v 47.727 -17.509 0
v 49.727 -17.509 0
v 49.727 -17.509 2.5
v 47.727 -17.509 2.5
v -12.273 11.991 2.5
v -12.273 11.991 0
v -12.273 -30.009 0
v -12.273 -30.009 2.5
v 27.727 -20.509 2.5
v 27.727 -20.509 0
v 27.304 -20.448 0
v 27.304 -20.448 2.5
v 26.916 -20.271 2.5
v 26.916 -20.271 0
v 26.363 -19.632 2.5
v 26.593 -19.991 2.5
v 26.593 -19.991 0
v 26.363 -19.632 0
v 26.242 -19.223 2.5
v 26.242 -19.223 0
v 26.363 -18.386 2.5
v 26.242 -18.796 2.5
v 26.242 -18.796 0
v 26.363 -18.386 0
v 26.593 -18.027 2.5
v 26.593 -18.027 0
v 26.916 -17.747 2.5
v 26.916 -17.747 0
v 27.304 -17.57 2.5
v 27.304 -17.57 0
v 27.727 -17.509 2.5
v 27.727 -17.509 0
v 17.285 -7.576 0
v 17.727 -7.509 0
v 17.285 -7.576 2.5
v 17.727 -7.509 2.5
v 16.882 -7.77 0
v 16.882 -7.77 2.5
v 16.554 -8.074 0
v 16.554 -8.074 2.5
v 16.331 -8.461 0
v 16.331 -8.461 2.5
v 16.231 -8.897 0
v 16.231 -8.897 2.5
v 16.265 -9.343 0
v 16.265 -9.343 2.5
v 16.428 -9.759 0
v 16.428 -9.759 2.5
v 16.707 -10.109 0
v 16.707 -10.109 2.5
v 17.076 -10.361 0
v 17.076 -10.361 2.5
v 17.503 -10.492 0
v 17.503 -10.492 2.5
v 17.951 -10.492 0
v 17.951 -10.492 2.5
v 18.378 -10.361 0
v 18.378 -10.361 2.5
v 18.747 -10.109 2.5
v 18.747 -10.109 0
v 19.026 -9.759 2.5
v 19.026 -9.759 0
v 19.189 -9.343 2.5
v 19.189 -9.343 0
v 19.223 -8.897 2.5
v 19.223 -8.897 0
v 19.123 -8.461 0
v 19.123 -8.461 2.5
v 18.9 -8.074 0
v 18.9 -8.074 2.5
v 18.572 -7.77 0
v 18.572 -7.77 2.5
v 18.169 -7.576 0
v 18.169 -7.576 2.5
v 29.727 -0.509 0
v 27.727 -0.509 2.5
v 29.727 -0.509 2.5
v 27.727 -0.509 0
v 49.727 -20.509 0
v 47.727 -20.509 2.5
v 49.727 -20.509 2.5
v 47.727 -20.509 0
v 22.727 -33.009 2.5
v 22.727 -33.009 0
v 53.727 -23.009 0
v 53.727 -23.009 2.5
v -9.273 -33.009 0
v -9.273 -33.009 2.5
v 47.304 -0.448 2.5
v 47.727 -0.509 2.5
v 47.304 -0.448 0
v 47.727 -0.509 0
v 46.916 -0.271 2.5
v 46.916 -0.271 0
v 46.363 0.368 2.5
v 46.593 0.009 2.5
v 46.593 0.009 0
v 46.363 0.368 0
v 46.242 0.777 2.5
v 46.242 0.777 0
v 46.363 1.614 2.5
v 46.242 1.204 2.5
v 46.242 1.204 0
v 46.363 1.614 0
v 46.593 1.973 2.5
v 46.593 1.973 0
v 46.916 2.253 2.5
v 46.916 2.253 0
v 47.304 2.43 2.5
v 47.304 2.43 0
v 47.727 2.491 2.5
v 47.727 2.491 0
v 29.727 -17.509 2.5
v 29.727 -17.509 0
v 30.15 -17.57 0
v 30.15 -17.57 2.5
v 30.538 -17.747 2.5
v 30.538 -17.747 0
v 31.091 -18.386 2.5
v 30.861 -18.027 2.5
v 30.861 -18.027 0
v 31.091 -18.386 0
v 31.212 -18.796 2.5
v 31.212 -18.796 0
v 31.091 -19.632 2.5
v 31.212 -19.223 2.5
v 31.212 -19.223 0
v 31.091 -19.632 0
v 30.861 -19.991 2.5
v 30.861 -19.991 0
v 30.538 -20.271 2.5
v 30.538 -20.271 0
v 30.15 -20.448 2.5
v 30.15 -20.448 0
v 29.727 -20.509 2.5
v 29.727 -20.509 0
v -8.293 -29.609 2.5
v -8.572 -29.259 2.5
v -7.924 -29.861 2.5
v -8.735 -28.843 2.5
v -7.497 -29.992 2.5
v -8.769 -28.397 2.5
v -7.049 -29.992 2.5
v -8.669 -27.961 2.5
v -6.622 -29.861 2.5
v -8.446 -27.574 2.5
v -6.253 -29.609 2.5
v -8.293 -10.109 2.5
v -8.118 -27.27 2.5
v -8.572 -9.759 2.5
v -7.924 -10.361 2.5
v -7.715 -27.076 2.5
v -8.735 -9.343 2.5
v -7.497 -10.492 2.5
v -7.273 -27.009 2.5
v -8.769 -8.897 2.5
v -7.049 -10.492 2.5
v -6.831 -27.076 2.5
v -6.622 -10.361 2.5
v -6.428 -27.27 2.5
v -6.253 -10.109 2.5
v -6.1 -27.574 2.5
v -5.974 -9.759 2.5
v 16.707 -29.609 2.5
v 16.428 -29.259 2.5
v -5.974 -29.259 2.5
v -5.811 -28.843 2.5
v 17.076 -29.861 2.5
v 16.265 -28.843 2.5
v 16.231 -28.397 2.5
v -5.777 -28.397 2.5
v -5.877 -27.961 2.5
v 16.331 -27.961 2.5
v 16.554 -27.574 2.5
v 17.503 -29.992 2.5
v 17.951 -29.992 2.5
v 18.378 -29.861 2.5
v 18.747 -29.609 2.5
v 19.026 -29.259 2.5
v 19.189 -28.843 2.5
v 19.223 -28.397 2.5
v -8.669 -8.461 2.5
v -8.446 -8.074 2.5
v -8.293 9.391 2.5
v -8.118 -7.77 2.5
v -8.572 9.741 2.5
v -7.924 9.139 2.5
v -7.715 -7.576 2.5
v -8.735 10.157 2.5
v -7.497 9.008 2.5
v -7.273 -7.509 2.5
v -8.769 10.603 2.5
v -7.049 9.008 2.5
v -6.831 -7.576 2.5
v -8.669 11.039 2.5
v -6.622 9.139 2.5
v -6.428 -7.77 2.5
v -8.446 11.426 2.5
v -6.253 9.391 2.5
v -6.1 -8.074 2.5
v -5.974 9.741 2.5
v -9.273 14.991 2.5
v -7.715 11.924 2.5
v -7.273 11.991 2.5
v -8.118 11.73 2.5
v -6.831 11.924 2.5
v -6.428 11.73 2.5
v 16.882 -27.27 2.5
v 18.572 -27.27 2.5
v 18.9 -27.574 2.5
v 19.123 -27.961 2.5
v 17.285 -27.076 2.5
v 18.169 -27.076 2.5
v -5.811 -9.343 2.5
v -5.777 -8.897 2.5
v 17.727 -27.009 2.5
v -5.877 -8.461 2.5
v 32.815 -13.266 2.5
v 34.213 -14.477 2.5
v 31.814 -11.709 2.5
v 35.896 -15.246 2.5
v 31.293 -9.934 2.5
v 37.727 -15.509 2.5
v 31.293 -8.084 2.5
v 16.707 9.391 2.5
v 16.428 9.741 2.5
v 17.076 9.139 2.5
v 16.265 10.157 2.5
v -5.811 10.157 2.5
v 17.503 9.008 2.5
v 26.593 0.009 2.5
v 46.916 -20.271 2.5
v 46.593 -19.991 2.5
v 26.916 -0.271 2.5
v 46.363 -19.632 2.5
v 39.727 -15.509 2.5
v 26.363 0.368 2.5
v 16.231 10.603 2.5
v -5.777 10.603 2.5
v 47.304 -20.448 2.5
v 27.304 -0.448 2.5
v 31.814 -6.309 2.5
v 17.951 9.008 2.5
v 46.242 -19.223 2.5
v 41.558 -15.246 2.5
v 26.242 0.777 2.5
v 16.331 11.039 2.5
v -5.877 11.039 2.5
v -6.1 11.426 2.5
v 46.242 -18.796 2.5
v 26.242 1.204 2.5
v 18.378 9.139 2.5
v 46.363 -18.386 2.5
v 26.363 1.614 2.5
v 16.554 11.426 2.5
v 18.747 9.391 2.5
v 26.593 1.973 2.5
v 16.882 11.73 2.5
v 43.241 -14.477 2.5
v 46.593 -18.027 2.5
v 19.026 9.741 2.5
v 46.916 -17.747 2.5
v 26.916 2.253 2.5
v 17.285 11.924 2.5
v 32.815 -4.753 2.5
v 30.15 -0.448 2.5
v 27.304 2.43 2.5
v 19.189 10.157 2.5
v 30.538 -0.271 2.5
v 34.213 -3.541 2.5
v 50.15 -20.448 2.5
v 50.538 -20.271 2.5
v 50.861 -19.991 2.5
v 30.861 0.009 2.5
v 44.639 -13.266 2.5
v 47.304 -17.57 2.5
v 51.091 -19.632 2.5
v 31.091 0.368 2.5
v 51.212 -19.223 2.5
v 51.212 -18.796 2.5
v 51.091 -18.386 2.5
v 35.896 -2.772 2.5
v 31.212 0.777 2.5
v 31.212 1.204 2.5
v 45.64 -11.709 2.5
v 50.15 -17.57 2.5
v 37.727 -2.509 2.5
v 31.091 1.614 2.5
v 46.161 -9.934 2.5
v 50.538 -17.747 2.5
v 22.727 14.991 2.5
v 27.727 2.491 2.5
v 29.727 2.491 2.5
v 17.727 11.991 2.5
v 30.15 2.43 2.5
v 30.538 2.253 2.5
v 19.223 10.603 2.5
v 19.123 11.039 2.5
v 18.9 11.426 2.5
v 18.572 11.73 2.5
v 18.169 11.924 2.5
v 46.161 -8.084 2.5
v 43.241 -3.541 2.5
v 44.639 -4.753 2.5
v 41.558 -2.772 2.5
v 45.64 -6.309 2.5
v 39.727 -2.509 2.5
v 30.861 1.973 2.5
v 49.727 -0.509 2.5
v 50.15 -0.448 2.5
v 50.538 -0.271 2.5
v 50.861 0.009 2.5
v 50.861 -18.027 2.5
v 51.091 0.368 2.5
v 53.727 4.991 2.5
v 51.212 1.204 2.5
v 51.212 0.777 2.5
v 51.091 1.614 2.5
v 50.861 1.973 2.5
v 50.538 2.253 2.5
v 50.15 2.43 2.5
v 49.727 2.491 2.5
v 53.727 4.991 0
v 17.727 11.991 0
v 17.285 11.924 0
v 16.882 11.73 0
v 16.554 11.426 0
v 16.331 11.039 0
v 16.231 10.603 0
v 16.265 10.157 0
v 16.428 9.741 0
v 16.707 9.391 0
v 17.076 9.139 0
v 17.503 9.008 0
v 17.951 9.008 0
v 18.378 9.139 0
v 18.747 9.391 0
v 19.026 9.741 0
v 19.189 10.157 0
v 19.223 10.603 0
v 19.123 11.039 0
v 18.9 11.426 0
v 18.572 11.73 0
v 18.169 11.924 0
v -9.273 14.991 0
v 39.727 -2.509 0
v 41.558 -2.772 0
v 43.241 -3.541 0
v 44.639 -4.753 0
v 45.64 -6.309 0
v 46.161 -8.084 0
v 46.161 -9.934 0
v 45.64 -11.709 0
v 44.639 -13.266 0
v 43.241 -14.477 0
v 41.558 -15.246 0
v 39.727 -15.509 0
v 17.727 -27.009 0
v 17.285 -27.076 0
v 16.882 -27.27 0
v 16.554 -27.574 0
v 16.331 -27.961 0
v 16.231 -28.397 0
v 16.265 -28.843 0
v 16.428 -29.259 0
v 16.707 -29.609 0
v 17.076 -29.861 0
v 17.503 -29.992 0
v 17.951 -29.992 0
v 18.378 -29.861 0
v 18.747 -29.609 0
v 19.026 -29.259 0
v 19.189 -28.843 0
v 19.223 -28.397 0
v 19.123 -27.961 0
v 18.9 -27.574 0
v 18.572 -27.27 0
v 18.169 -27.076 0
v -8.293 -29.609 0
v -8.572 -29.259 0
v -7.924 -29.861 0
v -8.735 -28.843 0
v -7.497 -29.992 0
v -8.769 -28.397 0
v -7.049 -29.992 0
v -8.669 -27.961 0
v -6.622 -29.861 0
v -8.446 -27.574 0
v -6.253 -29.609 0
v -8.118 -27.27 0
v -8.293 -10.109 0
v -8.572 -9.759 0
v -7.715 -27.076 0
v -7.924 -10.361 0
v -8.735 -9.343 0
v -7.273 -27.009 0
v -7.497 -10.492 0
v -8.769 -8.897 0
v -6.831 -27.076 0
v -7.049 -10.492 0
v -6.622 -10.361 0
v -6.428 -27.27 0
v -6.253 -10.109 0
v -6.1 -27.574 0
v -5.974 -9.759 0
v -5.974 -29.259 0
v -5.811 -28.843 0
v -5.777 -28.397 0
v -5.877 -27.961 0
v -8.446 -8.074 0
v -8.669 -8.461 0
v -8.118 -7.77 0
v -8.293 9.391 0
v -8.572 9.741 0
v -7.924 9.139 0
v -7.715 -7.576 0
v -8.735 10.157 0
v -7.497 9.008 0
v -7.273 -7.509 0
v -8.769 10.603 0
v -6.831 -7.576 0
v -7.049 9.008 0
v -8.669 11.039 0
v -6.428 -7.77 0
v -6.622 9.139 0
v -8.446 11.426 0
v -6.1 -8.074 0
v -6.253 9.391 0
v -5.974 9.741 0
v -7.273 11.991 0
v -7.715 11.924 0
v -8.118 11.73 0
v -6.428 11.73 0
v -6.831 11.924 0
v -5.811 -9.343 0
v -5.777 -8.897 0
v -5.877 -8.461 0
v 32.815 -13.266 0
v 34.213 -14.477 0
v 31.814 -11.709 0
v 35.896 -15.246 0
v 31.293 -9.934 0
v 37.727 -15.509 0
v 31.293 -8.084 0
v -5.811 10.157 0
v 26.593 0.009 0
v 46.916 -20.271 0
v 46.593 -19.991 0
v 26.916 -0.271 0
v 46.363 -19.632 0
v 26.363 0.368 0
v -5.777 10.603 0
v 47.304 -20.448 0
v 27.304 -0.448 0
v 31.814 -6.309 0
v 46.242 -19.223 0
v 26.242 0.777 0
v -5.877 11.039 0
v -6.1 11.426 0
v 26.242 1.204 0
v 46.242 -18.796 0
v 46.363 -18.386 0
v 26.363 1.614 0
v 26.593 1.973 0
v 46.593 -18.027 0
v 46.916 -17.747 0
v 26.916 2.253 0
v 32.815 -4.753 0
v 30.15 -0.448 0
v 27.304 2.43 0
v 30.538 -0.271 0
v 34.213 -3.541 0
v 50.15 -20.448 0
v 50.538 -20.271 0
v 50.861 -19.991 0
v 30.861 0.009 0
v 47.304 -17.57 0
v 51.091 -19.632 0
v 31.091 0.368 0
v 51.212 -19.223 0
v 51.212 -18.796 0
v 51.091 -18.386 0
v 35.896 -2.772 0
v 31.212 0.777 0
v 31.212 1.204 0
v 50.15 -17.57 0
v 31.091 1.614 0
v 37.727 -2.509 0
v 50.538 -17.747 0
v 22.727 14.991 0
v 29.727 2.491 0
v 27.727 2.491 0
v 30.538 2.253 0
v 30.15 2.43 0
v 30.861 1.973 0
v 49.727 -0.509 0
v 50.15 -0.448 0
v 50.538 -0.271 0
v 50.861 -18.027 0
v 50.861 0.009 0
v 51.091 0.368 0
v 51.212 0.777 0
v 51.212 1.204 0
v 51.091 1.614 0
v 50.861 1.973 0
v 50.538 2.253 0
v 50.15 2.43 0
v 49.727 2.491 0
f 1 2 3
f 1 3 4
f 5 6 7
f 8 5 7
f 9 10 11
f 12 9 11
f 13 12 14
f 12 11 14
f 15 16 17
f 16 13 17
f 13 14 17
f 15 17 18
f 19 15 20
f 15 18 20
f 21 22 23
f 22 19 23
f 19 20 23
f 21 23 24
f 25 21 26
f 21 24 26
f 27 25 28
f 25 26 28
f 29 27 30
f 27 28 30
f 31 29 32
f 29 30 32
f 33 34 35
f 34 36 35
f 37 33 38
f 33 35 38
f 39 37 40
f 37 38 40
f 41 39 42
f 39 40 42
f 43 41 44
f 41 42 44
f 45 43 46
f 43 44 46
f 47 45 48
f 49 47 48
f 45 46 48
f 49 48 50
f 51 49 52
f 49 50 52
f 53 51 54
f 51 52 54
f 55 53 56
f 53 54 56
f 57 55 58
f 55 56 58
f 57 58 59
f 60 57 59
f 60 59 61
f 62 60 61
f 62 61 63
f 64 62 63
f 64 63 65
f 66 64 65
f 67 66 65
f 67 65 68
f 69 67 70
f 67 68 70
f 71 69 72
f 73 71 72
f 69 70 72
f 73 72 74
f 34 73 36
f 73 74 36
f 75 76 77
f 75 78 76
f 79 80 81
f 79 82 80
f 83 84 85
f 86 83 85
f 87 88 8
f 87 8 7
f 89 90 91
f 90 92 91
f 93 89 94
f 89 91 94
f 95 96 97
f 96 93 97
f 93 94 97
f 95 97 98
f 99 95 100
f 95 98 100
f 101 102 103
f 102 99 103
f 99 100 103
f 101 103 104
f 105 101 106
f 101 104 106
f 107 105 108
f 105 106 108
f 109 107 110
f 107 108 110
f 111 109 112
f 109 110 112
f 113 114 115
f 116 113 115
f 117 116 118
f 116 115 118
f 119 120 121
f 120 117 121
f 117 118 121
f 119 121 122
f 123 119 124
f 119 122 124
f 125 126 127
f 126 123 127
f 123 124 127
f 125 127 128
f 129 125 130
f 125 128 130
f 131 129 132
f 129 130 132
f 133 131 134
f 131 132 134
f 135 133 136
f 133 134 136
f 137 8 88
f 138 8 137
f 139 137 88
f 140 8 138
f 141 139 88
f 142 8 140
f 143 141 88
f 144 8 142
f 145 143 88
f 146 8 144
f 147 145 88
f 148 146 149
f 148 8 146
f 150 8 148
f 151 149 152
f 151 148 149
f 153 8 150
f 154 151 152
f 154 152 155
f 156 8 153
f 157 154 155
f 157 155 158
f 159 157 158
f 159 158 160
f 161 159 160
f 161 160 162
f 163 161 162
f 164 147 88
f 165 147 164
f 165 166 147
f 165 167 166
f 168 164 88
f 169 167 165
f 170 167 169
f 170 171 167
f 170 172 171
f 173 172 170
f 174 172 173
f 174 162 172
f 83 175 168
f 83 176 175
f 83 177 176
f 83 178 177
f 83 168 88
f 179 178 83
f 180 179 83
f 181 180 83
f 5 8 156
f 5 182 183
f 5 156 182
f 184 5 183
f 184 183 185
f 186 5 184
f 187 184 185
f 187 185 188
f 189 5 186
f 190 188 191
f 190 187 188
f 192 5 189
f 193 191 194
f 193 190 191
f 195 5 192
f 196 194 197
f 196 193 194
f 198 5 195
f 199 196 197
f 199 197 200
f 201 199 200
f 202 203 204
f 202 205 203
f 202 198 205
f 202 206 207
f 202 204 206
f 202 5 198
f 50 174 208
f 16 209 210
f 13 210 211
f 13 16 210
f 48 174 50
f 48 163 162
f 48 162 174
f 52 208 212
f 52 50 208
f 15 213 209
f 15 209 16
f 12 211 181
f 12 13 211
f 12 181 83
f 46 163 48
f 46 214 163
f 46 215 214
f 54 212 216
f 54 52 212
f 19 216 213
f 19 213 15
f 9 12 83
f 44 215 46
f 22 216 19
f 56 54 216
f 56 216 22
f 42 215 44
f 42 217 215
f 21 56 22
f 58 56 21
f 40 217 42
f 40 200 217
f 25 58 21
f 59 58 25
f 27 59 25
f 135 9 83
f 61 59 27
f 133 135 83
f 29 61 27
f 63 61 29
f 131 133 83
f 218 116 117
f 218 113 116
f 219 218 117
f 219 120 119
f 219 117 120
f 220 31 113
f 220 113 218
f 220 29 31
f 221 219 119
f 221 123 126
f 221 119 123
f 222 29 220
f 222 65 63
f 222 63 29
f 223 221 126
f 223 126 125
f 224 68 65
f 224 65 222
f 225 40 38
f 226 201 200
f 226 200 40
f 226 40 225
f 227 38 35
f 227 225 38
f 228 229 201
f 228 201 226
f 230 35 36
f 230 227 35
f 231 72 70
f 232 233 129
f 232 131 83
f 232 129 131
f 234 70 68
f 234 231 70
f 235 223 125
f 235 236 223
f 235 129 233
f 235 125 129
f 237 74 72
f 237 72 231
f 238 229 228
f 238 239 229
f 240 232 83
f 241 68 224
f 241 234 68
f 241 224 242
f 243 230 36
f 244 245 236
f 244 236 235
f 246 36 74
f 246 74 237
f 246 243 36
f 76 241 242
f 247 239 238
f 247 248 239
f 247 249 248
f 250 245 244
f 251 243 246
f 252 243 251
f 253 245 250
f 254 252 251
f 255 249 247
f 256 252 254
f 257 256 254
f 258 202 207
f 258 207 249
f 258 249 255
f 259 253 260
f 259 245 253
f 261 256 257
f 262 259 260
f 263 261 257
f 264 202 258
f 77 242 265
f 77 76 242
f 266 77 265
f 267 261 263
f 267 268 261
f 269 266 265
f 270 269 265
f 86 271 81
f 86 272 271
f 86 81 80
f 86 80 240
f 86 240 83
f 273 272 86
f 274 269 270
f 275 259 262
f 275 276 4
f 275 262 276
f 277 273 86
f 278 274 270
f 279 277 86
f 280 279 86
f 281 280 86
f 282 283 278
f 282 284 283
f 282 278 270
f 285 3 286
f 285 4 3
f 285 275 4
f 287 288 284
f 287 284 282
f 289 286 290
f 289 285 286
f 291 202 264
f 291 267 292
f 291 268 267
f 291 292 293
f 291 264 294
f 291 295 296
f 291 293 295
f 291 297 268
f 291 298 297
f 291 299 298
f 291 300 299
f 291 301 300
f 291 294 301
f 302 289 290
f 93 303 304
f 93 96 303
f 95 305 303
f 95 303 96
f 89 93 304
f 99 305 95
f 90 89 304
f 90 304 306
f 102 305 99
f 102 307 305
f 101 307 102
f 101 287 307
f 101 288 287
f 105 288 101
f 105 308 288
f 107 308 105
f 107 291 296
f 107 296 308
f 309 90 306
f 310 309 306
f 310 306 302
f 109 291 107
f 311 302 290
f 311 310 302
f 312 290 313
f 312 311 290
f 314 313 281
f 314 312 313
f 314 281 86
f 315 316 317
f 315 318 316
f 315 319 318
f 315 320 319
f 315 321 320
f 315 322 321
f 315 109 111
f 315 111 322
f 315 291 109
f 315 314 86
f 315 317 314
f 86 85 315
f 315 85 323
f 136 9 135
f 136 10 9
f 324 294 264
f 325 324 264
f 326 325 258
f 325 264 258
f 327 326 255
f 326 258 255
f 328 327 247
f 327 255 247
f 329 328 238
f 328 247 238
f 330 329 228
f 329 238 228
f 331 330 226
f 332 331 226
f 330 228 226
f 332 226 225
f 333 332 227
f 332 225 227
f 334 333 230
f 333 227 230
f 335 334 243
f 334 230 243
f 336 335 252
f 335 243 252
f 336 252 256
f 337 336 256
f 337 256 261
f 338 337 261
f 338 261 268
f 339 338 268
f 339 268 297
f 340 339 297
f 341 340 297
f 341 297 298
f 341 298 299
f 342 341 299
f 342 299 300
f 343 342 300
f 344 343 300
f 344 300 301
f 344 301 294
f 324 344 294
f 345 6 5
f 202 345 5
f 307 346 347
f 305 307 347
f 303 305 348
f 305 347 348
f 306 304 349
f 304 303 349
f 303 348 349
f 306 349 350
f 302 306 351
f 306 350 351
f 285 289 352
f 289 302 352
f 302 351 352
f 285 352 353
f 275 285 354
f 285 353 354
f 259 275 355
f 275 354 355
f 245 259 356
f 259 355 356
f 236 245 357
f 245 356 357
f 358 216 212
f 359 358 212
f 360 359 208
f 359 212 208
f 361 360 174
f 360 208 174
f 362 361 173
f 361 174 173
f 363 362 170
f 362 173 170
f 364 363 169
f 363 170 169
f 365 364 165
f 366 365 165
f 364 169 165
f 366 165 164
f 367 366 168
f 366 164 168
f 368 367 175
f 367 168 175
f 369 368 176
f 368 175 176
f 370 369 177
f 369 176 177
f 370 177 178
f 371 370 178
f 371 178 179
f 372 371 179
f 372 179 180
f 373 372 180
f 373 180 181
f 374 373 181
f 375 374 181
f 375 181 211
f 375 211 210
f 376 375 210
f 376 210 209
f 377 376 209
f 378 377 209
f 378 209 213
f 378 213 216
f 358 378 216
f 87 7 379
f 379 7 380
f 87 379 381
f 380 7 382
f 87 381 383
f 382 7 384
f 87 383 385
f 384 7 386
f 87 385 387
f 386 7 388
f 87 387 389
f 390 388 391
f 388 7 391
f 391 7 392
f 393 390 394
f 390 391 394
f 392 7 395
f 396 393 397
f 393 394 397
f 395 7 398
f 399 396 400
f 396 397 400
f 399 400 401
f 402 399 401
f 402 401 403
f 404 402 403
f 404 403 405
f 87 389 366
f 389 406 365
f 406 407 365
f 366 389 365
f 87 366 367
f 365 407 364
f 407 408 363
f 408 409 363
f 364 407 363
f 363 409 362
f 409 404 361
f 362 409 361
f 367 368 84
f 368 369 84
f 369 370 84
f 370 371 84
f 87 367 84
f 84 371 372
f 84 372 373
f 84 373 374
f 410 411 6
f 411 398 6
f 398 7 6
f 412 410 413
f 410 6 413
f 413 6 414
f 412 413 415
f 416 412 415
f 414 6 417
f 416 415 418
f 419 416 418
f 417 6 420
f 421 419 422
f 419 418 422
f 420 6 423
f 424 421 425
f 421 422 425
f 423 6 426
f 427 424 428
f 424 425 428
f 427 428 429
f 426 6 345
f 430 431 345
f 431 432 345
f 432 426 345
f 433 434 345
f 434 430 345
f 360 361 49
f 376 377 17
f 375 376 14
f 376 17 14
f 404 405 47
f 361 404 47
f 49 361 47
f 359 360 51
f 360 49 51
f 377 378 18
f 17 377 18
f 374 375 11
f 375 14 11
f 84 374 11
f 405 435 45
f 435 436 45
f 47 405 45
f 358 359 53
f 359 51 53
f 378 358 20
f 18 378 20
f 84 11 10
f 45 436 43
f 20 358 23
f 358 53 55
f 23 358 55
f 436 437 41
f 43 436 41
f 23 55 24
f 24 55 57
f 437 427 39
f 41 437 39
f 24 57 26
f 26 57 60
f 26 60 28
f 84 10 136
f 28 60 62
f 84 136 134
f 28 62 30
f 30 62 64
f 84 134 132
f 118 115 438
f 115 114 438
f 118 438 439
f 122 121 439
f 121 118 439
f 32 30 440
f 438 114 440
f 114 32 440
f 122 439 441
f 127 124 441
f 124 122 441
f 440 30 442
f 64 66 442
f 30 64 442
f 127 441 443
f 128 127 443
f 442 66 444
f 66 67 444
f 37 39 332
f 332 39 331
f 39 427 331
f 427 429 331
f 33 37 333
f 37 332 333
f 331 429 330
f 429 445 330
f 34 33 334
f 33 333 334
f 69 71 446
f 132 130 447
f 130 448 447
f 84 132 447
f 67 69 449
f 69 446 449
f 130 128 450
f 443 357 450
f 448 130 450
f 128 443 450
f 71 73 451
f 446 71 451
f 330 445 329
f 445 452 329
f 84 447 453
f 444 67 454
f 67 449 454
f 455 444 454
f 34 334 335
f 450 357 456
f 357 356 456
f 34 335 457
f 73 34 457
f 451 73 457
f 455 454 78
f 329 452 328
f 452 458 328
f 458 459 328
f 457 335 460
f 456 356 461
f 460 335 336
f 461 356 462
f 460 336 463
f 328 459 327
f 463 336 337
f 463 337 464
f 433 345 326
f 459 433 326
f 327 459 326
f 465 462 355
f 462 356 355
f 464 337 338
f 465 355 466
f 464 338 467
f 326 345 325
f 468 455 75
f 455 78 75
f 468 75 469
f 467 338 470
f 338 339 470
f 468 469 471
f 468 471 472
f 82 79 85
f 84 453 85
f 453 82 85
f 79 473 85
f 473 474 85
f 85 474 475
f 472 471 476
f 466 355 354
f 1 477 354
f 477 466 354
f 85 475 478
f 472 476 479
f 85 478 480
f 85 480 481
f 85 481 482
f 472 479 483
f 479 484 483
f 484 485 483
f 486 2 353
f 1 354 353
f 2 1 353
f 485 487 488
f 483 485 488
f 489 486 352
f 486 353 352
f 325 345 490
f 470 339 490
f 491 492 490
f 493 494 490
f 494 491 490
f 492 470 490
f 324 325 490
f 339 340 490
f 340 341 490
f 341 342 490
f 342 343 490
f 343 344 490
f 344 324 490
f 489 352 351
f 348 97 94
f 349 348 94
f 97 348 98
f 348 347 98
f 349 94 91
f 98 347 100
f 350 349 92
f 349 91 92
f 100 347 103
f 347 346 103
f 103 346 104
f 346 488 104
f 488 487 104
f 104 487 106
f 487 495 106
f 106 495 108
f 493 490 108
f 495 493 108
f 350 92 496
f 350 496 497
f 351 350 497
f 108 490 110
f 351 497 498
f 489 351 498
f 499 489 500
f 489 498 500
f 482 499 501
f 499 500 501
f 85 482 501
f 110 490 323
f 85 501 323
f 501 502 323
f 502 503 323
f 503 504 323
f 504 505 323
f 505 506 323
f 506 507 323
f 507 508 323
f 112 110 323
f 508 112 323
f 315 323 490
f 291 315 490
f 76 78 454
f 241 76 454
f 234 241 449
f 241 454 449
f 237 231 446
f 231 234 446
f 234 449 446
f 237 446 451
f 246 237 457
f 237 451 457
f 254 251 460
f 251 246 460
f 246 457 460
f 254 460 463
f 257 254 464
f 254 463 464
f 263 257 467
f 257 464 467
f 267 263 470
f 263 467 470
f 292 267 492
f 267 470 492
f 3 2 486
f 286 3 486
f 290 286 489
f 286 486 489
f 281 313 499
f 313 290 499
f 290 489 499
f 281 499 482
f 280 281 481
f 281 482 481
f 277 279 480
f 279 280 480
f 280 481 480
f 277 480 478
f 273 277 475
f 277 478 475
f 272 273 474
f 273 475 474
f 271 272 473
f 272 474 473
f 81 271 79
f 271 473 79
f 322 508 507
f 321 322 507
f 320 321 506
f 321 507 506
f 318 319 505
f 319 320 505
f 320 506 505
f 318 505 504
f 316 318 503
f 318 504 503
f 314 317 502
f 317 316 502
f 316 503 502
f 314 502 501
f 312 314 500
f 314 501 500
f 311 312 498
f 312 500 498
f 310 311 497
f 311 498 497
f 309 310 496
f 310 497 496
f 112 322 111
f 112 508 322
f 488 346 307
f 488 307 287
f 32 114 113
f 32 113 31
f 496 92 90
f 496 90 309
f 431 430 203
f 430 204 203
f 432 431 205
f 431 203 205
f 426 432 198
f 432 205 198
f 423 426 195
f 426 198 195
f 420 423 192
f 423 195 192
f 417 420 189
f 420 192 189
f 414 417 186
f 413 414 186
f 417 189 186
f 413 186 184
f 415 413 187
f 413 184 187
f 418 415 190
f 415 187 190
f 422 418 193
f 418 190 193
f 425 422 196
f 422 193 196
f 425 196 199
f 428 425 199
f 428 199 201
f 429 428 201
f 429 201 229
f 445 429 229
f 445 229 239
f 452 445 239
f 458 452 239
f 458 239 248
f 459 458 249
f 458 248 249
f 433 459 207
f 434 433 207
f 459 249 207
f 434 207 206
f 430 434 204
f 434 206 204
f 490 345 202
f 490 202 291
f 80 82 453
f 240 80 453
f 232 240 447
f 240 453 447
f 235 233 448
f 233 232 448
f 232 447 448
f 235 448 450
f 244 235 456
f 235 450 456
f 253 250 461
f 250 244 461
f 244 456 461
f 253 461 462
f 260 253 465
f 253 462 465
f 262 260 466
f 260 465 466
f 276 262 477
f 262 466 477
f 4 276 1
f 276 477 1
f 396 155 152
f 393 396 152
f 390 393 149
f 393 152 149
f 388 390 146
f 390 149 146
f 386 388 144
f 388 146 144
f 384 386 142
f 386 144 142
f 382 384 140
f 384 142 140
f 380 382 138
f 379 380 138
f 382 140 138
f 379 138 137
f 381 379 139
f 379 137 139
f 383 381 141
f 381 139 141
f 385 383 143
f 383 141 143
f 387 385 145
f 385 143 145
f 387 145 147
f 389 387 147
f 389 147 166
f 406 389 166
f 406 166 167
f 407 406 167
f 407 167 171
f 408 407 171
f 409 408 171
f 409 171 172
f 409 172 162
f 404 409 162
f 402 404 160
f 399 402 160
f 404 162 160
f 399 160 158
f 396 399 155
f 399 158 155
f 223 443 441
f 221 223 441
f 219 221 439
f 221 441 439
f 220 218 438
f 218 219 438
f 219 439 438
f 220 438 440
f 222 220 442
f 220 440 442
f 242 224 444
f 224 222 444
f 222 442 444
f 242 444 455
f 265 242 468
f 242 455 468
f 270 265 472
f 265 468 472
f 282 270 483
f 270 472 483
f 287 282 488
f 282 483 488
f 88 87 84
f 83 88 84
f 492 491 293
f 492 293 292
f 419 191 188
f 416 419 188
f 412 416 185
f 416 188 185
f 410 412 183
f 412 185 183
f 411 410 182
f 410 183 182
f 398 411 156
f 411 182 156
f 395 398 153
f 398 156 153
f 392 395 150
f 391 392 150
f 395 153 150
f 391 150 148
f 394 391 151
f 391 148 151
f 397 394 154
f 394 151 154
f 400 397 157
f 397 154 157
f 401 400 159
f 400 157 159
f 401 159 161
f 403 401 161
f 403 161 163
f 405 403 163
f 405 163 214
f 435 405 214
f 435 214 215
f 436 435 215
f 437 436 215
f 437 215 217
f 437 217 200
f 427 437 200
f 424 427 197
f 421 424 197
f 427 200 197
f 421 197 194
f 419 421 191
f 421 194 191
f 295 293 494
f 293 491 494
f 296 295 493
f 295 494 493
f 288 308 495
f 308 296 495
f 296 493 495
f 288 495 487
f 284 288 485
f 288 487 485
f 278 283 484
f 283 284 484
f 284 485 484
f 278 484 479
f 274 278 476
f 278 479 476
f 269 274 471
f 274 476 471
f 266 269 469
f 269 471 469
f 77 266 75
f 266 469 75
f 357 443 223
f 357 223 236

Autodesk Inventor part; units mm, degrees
ref_plane "YZ Plane" through (0, 0, 0) normal (1, 0, 0) x (0, 1, 0)
ref_plane "XZ Plane" through (0, 0, 0) normal (0, 1, 0) x (-1, 0, 0)
ref_plane "XY Plane" through (0, 0, 0) normal (0, 0, 1) x (1, 0, 0)
sketch "Sketch1" plane through (0, 0, 0) normal (0, 0, 1) x (1, 0, 0)
  line L0 (-12.273, 14.9908) -> (-12.273, -33.0092)
  line L1 (-12.273, -33.0092) -> (22.727, -33.0092)
  line L2 (53.727, -23.0092) -> (53.727, 4.9908)
  line L3 (-12.273, 14.9908) -> (22.727, 14.9908)
  line L4 (22.727, 14.9908) -> (22.727, 4.9908)
  line L5 (22.727, 4.9908) -> (53.727, 4.9908)
  line L6 (22.727, 4.9908) -> (22.727, -33.0092)
  line L7 (53.727, -23.0092) -> (22.727, -23.0092)
  line L8 (22.727, -33.0092) -> (53.727, -23.0092)
  line L9 (53.727, 4.9908) -> (22.727, 14.9908)
  line L10 (29.727, 0.9908) -> (27.727, 0.9908) construction
  line L11 (29.727, 2.4908) -> (27.727, 2.4908)
  line L12 (27.727, -0.5092) -> (29.727, -0.5092)
  arc A0 (29.727, -0.5092) -> (29.727, 2.4908) centre (29.727, 0.9908) ccw
  arc A1 (27.727, 2.4908) -> (27.727, -0.5092) centre (27.727, 0.9908) ccw
  line L13 (49.727, 0.9908) -> (47.727, 0.9908) construction
  line L14 (49.727, 2.4908) -> (47.727, 2.4908)
  line L15 (47.727, -0.5092) -> (49.727, -0.5092)
  arc A2 (49.727, -0.5092) -> (49.727, 2.4908) centre (49.727, 0.9908) ccw
  arc A3 (47.727, 2.4908) -> (47.727, -0.5092) centre (47.727, 0.9908) ccw
  line L16 (29.727, -19.0092) -> (27.727, -19.0092) construction
  line L17 (29.727, -17.5092) -> (27.727, -17.5092)
  line L18 (27.727, -20.5092) -> (29.727, -20.5092)
  arc A4 (29.727, -20.5092) -> (29.727, -17.5092) centre (29.727, -19.0092) ccw
  arc A5 (27.727, -17.5092) -> (27.727, -20.5092) centre (27.727, -19.0092) ccw
  line L19 (49.727, -19.0092) -> (47.727, -19.0092) construction
  line L20 (49.727, -17.5092) -> (47.727, -17.5092)
  line L21 (47.727, -20.5092) -> (49.727, -20.5092)
  arc A6 (49.727, -20.5092) -> (49.727, -17.5092) centre (49.727, -19.0092) ccw
  arc A7 (47.727, -17.5092) -> (47.727, -20.5092) centre (47.727, -19.0092) ccw
  line L22 (39.727, -9.0092) -> (37.727, -9.0092) construction
  line L23 (39.727, -2.5092) -> (37.727, -2.5092)
  line L24 (37.727, -15.5092) -> (39.727, -15.5092)
  arc A8 (39.727, -15.5092) -> (39.727, -2.5092) centre (39.727, -9.0092) ccw
  arc A9 (37.727, -2.5092) -> (37.727, -15.5092) centre (37.727, -9.0092) ccw
  point P0 (0, 0)
  point P1 (-7.273, 10.4908)
  point P2 (-7.273, -9.0092)
  point P3 (-7.273, -28.5092)
  point P4 (17.727, 10.4908)
  point P5 (17.727, -9.0092)
  point P6 (17.727, -28.5092)
  point P7 (28.727, 0.9908)
  point P8 (48.727, 0.9908)
  point P9 (28.727, -19.0092)
  point P10 (48.727, -19.0092)
  point P11 (38.727, -9.0092)
  dimension "d0" = 48
  dimension "d2" = 28
  dimension "d3" = 35
  dimension "d4" = 5
  dimension "d5" = 5
  dimension "d6" = 4.5
  dimension "d7" = 4.5
  dimension "d8" = 24
  dimension "d9" = 20
  dimension "d10" = 20
  dimension "d13" = 10
  dimension "d14" = 10
  dimension "d44" = 4
  dimension "d45" = 66
  dimension "d46" = 4
  dimension "d47" = 10
  dimension "d53" = 31
  dimension "d54" = 2
  dimension "d55" = 3
  dimension "d56" = 2
  dimension "d57" = 3
  dimension "d58" = 2
  dimension "d59" = 3
  dimension "d60" = 2
  dimension "d61" = 3
  dimension "d62" = 2
  dimension "d63" = 13
extrude "Extrusion1" add sketch "Sketch1" along normal blind 2.5
hole "Hole1" at (-7.273, 10.4908, 0) at (-7.273, -9.0092, 0) at (-7.273, -28.5092, 0) at (17.727, 10.4908, 0) at (17.727, -9.0092, 0) at (17.727, -28.5092, 0) direction (0, 0, 1) diameter 3 end through all
chamfer "Chamfer3" distance 3 angle 45 2 edges at (-12.273, -33.0092, 1.25) (-12.273, 14.9908, 1.25)
equation "\"d5\" = d4"
equation "\"d10\" = d9"
equation "\"d13\" = 0.5 * d9"
equation "\"d14\" = d13"
equation "\"d44\" = d46"
equation "\"d46\" = -0.5 * d9 + 0.5 * d2"
equation "\"d47\" = -0.5 * d2 + 0.5 * d0"
properties part number "LC_ALU_3mm_X_axis_belt_idler_mount_plate" material "Aluminum 6061-AHC"
